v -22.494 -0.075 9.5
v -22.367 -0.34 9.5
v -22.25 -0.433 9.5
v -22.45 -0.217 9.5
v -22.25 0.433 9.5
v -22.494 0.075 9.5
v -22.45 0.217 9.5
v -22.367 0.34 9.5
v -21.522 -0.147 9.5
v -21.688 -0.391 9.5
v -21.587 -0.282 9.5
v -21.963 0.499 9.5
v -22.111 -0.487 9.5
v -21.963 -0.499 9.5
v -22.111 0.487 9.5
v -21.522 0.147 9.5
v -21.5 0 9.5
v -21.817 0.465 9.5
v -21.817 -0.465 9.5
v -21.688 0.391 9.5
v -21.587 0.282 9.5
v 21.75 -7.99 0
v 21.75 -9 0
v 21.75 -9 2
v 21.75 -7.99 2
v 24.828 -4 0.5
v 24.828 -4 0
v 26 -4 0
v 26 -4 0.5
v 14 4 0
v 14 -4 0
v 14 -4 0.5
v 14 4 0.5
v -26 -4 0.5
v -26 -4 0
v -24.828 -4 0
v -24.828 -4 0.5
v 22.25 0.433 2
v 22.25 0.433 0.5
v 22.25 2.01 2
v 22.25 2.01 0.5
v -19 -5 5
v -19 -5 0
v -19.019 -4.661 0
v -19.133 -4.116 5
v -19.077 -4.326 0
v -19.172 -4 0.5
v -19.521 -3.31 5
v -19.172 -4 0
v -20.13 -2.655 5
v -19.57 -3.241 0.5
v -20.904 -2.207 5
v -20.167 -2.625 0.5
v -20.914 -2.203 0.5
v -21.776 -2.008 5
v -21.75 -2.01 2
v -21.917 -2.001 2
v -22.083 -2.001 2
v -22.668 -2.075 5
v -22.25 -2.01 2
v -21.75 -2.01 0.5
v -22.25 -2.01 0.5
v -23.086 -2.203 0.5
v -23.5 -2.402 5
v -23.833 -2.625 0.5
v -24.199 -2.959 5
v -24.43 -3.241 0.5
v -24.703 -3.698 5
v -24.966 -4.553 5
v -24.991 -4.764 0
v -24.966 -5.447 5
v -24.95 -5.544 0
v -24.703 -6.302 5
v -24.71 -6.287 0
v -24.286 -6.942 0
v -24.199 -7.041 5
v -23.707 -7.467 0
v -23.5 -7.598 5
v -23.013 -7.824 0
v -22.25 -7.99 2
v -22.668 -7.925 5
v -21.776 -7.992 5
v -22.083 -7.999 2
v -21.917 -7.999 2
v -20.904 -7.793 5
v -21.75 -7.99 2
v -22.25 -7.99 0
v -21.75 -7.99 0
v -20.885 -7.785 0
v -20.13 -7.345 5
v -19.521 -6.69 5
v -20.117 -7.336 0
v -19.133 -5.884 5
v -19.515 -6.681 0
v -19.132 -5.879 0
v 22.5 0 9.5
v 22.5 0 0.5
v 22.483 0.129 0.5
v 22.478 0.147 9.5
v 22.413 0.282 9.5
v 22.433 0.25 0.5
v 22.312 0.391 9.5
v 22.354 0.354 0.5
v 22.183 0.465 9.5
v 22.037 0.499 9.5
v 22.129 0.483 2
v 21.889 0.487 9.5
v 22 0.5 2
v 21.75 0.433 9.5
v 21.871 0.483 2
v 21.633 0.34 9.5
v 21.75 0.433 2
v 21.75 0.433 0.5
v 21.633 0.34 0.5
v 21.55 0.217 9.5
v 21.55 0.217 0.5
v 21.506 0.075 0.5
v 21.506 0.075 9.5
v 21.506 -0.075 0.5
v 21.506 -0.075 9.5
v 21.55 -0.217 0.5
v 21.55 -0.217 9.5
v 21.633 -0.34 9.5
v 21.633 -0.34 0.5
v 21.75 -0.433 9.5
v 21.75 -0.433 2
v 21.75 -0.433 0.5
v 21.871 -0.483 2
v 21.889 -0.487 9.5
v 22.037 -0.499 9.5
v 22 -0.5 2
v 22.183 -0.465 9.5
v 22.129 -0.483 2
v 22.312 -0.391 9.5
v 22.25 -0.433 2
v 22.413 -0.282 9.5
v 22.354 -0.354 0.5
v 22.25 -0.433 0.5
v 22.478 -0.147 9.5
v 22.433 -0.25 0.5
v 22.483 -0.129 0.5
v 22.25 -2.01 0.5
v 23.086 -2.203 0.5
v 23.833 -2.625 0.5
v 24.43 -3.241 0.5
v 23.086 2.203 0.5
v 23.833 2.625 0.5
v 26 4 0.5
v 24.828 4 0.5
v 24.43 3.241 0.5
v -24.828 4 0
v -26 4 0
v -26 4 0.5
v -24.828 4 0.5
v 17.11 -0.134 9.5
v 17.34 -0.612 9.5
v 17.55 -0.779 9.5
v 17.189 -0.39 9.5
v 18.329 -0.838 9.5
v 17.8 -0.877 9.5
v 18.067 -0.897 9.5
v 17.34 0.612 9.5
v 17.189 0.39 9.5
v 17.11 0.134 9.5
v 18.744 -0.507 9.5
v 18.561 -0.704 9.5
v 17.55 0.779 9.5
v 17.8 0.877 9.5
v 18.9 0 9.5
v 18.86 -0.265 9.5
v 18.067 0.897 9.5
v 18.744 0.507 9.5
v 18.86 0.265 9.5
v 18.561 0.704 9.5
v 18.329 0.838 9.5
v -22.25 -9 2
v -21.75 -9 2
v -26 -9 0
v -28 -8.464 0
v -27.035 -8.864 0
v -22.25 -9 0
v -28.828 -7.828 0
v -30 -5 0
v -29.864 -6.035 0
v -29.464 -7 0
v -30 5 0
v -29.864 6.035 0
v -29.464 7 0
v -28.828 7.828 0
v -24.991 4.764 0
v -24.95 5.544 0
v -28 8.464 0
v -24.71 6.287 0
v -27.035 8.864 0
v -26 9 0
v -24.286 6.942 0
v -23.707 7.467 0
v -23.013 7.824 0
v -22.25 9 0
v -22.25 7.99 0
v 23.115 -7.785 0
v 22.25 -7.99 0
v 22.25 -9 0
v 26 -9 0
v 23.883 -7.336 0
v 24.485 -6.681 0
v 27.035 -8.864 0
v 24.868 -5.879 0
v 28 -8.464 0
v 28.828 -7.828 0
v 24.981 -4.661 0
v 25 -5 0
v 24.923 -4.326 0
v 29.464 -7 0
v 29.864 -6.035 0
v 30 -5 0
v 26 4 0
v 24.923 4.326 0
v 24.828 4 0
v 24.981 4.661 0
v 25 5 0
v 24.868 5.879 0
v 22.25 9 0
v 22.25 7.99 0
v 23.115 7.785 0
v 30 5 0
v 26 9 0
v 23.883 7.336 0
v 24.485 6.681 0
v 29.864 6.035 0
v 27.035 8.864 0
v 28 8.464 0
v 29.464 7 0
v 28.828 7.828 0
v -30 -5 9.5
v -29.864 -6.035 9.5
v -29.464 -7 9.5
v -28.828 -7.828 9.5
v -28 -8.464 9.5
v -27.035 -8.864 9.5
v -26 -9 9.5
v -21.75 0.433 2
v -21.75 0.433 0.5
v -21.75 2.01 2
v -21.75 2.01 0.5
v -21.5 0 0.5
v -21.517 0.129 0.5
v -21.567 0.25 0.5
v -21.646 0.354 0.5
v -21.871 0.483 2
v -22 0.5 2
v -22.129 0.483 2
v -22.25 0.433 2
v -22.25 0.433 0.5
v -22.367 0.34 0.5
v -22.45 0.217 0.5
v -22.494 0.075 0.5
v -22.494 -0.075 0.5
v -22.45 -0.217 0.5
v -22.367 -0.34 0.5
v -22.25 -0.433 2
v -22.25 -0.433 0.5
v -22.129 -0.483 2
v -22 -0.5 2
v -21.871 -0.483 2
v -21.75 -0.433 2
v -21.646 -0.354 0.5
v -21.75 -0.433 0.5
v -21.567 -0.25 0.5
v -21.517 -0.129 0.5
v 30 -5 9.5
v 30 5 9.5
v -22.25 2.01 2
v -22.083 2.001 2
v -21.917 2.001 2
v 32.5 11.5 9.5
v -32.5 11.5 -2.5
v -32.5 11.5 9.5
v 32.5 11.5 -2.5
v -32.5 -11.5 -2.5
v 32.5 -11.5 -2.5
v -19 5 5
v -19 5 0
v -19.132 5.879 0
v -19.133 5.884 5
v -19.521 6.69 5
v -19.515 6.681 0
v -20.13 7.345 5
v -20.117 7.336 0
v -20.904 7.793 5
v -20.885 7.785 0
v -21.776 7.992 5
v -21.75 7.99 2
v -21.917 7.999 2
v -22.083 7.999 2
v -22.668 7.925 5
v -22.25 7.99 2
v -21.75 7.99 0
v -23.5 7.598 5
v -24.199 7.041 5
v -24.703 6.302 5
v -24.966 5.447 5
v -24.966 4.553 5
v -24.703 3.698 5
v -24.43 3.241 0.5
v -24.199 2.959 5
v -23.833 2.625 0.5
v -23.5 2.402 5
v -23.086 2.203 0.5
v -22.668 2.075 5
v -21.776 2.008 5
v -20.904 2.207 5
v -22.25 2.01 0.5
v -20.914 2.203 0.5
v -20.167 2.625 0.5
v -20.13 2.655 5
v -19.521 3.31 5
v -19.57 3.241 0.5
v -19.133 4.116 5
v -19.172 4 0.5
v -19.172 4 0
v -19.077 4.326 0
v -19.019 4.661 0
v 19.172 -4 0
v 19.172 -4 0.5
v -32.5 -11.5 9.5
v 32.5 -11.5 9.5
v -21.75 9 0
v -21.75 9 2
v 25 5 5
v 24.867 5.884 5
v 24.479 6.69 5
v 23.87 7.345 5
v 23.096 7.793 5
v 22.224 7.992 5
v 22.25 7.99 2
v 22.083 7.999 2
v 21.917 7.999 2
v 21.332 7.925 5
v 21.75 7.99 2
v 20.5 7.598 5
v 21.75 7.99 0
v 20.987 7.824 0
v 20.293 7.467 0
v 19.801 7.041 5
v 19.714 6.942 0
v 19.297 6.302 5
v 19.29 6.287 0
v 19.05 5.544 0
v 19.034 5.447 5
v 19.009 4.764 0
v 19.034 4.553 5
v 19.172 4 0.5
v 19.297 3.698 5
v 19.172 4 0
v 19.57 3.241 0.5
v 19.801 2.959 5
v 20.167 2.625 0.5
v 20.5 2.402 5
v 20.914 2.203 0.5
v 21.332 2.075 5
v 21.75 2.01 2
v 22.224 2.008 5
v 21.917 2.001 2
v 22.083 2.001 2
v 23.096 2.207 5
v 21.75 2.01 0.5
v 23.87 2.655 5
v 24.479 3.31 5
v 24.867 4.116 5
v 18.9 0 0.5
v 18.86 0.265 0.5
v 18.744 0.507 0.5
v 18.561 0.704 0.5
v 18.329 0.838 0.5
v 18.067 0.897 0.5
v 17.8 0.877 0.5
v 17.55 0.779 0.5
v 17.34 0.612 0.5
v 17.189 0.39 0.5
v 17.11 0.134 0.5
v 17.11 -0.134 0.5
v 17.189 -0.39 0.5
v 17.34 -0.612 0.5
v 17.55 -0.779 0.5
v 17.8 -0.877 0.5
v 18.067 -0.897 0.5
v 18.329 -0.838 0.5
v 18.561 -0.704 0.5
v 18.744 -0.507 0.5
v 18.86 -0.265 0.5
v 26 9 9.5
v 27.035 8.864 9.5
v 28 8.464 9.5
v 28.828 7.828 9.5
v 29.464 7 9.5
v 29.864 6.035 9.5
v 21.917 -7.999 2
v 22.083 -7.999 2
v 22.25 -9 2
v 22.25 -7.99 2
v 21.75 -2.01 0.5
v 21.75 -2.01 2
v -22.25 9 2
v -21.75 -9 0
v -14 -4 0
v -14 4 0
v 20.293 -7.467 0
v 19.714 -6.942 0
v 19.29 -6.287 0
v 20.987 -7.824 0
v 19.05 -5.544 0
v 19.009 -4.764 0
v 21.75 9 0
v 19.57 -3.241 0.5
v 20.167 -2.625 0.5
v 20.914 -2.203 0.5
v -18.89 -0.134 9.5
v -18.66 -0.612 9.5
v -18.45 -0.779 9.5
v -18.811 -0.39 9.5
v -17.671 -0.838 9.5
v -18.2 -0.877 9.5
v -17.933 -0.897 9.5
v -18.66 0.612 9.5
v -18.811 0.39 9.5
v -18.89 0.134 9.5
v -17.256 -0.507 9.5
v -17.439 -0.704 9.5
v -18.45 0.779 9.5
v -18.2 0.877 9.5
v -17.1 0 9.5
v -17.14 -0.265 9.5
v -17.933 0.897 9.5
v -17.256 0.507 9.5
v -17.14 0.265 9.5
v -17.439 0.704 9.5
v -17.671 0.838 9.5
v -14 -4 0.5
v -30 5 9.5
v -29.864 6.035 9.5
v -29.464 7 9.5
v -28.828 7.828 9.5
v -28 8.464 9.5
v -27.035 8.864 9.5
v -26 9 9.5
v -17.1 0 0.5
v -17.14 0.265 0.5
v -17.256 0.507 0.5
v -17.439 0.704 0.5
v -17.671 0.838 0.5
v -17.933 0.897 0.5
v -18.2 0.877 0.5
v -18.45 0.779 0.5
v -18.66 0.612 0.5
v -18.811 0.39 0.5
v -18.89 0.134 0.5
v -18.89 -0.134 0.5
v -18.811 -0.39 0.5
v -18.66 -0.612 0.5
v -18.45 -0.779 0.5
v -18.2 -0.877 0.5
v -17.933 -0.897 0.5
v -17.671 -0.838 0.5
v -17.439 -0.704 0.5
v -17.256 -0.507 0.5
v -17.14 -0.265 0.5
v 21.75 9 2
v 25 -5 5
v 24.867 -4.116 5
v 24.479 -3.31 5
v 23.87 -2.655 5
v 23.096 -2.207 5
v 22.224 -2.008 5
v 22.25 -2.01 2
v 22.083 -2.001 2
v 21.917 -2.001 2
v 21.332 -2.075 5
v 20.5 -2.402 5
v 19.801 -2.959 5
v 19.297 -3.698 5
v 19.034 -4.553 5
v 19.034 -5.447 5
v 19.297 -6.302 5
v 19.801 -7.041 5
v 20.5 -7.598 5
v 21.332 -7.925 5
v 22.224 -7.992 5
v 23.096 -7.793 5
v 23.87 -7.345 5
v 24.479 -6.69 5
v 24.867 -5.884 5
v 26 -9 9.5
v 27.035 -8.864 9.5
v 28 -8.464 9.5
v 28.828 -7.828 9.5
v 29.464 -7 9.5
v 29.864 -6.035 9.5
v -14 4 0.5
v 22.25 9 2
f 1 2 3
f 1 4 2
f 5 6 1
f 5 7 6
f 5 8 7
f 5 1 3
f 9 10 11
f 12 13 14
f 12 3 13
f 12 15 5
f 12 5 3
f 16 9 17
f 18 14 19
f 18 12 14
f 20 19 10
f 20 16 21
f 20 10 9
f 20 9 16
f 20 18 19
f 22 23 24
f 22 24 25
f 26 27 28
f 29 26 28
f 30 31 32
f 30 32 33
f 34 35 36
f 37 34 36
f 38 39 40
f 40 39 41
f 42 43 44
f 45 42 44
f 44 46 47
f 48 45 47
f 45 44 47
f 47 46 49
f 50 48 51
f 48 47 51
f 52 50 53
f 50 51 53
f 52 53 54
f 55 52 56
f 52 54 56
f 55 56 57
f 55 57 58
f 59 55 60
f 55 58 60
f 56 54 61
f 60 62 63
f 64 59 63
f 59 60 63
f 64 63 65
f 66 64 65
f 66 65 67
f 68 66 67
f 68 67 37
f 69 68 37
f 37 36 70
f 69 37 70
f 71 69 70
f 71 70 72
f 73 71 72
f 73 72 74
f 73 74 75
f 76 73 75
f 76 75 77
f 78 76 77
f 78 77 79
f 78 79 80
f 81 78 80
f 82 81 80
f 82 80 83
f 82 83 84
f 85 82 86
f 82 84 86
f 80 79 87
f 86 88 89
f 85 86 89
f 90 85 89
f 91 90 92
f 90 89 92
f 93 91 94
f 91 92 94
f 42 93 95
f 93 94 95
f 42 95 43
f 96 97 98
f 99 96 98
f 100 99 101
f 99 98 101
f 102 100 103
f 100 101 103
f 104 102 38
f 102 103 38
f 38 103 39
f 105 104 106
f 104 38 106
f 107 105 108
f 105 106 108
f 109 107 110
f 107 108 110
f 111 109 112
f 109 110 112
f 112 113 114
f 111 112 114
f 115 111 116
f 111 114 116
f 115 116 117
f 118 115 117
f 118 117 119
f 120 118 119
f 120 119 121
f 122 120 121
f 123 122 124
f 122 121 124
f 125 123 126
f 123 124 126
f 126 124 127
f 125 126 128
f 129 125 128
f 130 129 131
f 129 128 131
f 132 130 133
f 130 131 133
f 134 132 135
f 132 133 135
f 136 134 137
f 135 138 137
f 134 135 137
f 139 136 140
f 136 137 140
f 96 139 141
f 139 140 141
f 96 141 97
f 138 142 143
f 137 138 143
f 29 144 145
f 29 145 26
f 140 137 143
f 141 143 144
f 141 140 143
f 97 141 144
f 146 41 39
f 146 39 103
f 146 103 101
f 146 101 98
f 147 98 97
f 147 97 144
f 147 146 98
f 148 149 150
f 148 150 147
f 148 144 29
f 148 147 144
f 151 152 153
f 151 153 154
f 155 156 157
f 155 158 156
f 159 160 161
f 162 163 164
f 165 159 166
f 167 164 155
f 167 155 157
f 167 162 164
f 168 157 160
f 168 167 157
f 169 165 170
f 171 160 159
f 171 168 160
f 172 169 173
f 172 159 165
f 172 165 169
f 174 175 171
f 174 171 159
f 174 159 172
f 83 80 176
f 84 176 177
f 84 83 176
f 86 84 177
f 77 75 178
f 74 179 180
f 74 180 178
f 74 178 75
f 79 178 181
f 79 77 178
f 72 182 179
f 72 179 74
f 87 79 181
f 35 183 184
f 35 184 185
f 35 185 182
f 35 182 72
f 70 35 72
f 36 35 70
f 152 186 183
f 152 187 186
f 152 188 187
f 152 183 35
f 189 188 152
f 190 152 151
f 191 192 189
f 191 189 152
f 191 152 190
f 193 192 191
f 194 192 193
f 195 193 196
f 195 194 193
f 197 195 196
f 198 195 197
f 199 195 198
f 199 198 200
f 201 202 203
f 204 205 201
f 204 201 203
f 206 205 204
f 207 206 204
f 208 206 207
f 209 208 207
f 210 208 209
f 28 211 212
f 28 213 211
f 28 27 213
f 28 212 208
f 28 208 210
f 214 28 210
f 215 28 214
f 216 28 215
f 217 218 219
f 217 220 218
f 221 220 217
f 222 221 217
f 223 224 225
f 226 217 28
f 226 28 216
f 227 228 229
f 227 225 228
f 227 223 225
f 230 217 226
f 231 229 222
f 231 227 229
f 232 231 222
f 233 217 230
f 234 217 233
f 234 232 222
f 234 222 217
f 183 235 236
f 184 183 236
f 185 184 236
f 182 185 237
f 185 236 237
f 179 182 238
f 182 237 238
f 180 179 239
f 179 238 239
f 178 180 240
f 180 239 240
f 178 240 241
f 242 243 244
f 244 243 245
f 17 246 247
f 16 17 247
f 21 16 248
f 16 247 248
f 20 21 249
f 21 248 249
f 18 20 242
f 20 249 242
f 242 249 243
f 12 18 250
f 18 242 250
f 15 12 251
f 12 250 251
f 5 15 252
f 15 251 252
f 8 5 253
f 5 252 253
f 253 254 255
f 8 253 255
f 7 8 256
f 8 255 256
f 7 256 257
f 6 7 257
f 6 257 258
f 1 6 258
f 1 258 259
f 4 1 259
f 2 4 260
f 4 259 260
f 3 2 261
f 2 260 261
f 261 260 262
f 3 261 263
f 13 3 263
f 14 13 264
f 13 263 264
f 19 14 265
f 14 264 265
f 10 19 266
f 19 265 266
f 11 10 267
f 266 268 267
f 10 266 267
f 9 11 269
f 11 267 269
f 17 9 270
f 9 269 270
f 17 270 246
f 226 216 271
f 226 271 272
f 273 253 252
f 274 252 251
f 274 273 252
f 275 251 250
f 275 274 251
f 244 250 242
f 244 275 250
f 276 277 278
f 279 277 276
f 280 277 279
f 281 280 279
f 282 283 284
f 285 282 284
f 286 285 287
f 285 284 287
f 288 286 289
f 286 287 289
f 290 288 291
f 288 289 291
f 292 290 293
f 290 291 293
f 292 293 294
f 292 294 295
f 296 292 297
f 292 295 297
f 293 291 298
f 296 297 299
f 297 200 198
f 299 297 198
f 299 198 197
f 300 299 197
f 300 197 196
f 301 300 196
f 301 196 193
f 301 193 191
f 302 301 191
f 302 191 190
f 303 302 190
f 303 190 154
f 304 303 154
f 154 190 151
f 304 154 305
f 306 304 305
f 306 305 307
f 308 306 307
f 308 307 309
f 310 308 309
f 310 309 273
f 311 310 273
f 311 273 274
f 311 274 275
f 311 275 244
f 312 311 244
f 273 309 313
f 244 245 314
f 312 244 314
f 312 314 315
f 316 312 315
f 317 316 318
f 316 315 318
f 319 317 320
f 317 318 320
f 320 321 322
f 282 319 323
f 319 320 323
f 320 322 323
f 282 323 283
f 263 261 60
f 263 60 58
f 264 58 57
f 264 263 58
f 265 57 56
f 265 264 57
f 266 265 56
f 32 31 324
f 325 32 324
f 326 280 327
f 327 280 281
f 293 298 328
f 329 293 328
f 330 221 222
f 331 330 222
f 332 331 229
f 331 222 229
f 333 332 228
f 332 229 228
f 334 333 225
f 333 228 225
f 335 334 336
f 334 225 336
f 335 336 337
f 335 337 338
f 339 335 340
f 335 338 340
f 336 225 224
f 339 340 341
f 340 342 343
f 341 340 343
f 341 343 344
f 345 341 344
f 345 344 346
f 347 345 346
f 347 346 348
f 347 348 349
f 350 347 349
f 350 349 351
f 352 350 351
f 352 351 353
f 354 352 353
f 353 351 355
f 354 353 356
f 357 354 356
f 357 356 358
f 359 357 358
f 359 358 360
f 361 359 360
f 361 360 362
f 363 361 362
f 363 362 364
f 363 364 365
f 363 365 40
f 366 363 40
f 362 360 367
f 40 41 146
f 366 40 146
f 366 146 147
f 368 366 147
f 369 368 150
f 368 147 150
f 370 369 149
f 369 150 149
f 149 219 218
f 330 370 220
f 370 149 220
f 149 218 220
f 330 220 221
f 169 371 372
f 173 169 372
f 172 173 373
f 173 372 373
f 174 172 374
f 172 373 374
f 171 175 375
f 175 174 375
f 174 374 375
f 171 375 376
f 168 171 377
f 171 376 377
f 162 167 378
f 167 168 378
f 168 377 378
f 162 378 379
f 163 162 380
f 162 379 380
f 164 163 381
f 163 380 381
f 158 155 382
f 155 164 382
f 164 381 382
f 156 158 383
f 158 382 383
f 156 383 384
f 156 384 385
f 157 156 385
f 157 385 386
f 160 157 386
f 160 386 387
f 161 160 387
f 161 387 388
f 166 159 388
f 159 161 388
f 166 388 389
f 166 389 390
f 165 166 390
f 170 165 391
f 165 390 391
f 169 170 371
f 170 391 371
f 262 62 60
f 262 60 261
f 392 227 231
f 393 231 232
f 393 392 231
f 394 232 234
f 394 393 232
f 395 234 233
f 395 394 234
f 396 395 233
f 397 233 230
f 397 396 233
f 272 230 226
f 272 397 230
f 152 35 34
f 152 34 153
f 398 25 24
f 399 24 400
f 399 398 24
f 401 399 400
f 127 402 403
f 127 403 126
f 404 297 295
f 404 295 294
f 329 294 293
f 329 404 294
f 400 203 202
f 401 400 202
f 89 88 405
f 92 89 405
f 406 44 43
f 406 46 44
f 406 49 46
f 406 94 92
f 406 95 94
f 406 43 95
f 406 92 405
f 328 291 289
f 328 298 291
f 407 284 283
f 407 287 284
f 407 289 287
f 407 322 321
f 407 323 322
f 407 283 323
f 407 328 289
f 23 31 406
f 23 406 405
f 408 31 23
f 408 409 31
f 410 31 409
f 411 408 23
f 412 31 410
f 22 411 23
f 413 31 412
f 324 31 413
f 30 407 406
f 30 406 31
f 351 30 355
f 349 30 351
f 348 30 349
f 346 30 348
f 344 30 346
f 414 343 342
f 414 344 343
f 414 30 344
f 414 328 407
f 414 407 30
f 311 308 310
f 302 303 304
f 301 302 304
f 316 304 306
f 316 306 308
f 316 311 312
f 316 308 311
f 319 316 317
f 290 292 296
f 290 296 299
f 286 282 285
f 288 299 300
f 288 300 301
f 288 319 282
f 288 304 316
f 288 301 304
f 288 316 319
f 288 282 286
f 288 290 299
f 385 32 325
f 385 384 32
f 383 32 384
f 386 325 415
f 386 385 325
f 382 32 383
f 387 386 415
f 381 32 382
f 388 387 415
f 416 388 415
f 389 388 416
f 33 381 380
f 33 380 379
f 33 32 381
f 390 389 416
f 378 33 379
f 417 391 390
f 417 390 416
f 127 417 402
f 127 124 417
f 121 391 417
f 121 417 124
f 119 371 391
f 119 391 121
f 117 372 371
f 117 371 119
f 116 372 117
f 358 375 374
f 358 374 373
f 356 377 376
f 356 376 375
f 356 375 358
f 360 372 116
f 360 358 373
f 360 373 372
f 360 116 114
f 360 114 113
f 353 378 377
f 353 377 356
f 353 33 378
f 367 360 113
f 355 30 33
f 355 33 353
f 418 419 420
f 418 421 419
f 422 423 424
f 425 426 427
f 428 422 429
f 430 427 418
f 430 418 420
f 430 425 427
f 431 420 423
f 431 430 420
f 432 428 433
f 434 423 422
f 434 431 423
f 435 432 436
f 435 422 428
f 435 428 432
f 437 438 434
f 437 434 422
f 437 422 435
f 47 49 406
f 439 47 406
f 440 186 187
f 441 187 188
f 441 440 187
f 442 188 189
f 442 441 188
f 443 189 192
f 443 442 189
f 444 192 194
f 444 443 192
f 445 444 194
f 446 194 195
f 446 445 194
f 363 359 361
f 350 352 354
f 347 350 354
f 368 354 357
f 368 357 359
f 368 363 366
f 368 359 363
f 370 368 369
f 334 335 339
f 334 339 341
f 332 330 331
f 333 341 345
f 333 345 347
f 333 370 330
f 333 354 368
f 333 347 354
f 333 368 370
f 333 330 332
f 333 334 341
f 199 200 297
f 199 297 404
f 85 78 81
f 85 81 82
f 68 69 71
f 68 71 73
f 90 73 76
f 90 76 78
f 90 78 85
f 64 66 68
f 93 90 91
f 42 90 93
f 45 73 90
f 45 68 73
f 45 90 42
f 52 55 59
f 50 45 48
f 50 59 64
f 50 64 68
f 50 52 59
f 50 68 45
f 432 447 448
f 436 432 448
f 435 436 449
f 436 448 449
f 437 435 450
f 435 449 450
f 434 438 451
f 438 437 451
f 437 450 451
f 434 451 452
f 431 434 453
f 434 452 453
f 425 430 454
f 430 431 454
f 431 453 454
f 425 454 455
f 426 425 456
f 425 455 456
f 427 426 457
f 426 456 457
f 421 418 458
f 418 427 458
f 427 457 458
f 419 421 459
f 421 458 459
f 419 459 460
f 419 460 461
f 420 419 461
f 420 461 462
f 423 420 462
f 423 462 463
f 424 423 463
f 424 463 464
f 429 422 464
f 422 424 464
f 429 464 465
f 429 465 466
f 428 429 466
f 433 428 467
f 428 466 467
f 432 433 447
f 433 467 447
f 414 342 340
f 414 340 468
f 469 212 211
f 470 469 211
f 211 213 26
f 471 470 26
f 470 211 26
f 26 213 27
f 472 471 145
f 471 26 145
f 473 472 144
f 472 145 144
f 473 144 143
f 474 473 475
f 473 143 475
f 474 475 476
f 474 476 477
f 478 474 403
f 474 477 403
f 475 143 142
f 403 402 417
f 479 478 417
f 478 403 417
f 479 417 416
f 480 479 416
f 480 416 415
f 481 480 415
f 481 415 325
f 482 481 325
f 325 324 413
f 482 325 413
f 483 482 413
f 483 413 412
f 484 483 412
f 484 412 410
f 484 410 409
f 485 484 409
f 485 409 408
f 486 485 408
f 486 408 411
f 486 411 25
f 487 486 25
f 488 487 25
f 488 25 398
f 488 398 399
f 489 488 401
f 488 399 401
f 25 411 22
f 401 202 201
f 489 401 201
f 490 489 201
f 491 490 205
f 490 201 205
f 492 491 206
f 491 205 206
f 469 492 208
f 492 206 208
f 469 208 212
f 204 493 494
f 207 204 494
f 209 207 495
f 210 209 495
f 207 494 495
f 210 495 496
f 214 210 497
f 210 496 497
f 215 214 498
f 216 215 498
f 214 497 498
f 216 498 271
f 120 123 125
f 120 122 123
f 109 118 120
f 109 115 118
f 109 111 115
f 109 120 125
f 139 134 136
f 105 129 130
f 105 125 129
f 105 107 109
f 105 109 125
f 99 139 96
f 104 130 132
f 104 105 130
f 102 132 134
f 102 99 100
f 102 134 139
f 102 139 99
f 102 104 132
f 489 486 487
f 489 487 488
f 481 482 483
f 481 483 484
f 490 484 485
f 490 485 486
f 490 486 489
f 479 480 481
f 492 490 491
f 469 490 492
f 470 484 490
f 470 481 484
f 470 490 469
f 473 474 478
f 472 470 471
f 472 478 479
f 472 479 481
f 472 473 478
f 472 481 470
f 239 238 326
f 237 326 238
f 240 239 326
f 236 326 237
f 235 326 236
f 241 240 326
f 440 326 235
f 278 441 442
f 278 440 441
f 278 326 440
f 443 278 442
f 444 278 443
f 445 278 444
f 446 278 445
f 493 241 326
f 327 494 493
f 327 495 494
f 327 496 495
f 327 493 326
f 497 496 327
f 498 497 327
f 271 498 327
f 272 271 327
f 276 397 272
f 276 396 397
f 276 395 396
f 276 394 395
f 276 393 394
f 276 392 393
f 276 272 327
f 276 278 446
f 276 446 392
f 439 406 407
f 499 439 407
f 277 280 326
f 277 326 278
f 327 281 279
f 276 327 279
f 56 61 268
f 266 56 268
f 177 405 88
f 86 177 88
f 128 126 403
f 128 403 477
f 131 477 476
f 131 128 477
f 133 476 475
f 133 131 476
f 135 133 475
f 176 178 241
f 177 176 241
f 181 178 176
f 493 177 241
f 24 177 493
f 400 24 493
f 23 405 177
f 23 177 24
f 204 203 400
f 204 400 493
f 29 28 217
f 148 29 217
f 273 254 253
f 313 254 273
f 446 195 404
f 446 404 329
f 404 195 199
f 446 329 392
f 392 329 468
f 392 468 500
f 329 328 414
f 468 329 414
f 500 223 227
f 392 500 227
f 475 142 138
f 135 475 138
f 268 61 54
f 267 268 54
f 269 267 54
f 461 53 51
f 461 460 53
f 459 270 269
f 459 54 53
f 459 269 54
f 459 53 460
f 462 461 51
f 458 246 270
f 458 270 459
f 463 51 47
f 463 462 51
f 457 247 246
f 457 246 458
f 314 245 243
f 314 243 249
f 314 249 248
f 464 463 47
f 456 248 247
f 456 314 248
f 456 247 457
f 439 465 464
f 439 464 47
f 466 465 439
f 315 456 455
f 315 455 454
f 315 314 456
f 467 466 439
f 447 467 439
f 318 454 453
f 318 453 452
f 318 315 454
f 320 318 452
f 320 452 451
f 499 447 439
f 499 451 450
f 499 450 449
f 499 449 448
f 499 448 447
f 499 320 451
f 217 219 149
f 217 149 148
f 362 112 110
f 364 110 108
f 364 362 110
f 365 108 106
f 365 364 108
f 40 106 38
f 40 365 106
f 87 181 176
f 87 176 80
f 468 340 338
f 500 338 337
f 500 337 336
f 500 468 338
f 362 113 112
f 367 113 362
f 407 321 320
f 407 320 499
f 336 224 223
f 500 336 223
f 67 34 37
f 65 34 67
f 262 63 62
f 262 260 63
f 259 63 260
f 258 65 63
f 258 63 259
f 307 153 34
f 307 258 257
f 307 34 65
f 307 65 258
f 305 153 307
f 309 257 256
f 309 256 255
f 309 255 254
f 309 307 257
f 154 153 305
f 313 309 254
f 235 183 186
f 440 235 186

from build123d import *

# Parameters (mm, degrees)
SKETCH001_W  = 12
SKETCH001_H  = 8
PAD001_DEPTH = 0.5
BOX001_W     = 0.5
BOX001_H     = 30
BOX001_DEPTH = 2
BOX_W        = 0.5
BOX_H        = 30
BOX_DEPTH    = 2
SKETCH002_R  = 3
PAD002_DEPTH = 5
SKETCH_W     = 60
SKETCH_H     = 18
SKETCH_R     = 0.9
SKETCH_R_2   = 0.5
PAD_DEPTH    = 10
FILLET_R     = 4
BOX002_W     = 65
BOX002_H     = 23
BOX002_DEPTH = 12


with BuildPart() as axle_retainer_cutout:
    # Sketch001 → Pad001 (new body)
    with BuildSketch(Plane.XY):
        with Locations((-20, 0)):
            Rectangle(SKETCH001_W, SKETCH001_H)
        with Locations((20, 0)):
            Rectangle(SKETCH001_W, SKETCH001_H)
    extrude(amount=PAD001_DEPTH)


with BuildPart() as axle2_cutouts:
    # Box001 → Box001 (new body)
    with BuildSketch(Plane(origin=(-22.25, -15, 0), x_dir=(1, 0, 0), z_dir=(0, 0, 1))):
        with Locations((0.25, 15)):
            Rectangle(BOX001_W, BOX001_H)
    extrude(amount=BOX001_DEPTH)


with BuildPart() as axle1_cutouts:
    # Box → Box (new body)
    with BuildSketch(Plane(origin=(21.75, -15, 0), x_dir=(1, 0, 0), z_dir=(0, 0, 1))):
        with Locations((0.25, 15)):
            Rectangle(BOX_W, BOX_H)
    extrude(amount=BOX_DEPTH)


with BuildPart() as cutouts:
    # Sketch002 → Pad002 (new body)
    with BuildSketch(Plane.XY):
        with Locations((-22, 5)):
            Circle(SKETCH002_R)
        with Locations((-22, -5)):
            Circle(SKETCH002_R)
        with Locations((22, 5)):
            Circle(SKETCH002_R)
        with Locations((22, -5)):
            Circle(SKETCH002_R)
    extrude(amount=PAD002_DEPTH)

    # Fusion: union axle_retainer_cutout, Axle2 cutouts, Axle1 cutouts
    add(axle_retainer_cutout.part)
    add(axle2_cutouts.part)
    add(axle1_cutouts.part)


with BuildPart() as fillet_body:
    # Sketch → Pad (new body)
    with BuildSketch(Plane.XY):
        Rectangle(SKETCH_W, SKETCH_H)
        with Locations((-18, 0)):
            Circle(SKETCH_R, mode=Mode.SUBTRACT)
        with Locations((18, 0)):
            Circle(SKETCH_R, mode=Mode.SUBTRACT)
        with Locations((-22, 0)):
            Circle(SKETCH_R_2, mode=Mode.SUBTRACT)
        with Locations((22, 0)):
            Circle(SKETCH_R_2, mode=Mode.SUBTRACT)
    extrude(amount=PAD_DEPTH)

    # Cut: cut Cutouts
    add(cutouts.part, mode=Mode.SUBTRACT)

    # Fillet
    fillet_edges = [fillet_body.edges().sort_by_distance(p)[0] for p in [
        (-30, -9, 5),
        (30, -9, 5),
        (30, 9, 5),
        (-30, 9, 5),
    ]]
    fillet(fillet_edges, radius=FILLET_R)


with BuildPart() as cut001:
    # Box002 → Box002 (new body)
    with BuildSketch(Plane(origin=(-32.5, -11.5, -2.5), x_dir=(1, 0, 0), z_dir=(0, 0, 1))):
        with Locations((32.5, 11.5)):
            Rectangle(BOX002_W, BOX002_H)
    extrude(amount=BOX002_DEPTH)

    # Cut001: cut Fillet body
    add(fillet_body.part, mode=Mode.SUBTRACT)


solid = cut001.part
